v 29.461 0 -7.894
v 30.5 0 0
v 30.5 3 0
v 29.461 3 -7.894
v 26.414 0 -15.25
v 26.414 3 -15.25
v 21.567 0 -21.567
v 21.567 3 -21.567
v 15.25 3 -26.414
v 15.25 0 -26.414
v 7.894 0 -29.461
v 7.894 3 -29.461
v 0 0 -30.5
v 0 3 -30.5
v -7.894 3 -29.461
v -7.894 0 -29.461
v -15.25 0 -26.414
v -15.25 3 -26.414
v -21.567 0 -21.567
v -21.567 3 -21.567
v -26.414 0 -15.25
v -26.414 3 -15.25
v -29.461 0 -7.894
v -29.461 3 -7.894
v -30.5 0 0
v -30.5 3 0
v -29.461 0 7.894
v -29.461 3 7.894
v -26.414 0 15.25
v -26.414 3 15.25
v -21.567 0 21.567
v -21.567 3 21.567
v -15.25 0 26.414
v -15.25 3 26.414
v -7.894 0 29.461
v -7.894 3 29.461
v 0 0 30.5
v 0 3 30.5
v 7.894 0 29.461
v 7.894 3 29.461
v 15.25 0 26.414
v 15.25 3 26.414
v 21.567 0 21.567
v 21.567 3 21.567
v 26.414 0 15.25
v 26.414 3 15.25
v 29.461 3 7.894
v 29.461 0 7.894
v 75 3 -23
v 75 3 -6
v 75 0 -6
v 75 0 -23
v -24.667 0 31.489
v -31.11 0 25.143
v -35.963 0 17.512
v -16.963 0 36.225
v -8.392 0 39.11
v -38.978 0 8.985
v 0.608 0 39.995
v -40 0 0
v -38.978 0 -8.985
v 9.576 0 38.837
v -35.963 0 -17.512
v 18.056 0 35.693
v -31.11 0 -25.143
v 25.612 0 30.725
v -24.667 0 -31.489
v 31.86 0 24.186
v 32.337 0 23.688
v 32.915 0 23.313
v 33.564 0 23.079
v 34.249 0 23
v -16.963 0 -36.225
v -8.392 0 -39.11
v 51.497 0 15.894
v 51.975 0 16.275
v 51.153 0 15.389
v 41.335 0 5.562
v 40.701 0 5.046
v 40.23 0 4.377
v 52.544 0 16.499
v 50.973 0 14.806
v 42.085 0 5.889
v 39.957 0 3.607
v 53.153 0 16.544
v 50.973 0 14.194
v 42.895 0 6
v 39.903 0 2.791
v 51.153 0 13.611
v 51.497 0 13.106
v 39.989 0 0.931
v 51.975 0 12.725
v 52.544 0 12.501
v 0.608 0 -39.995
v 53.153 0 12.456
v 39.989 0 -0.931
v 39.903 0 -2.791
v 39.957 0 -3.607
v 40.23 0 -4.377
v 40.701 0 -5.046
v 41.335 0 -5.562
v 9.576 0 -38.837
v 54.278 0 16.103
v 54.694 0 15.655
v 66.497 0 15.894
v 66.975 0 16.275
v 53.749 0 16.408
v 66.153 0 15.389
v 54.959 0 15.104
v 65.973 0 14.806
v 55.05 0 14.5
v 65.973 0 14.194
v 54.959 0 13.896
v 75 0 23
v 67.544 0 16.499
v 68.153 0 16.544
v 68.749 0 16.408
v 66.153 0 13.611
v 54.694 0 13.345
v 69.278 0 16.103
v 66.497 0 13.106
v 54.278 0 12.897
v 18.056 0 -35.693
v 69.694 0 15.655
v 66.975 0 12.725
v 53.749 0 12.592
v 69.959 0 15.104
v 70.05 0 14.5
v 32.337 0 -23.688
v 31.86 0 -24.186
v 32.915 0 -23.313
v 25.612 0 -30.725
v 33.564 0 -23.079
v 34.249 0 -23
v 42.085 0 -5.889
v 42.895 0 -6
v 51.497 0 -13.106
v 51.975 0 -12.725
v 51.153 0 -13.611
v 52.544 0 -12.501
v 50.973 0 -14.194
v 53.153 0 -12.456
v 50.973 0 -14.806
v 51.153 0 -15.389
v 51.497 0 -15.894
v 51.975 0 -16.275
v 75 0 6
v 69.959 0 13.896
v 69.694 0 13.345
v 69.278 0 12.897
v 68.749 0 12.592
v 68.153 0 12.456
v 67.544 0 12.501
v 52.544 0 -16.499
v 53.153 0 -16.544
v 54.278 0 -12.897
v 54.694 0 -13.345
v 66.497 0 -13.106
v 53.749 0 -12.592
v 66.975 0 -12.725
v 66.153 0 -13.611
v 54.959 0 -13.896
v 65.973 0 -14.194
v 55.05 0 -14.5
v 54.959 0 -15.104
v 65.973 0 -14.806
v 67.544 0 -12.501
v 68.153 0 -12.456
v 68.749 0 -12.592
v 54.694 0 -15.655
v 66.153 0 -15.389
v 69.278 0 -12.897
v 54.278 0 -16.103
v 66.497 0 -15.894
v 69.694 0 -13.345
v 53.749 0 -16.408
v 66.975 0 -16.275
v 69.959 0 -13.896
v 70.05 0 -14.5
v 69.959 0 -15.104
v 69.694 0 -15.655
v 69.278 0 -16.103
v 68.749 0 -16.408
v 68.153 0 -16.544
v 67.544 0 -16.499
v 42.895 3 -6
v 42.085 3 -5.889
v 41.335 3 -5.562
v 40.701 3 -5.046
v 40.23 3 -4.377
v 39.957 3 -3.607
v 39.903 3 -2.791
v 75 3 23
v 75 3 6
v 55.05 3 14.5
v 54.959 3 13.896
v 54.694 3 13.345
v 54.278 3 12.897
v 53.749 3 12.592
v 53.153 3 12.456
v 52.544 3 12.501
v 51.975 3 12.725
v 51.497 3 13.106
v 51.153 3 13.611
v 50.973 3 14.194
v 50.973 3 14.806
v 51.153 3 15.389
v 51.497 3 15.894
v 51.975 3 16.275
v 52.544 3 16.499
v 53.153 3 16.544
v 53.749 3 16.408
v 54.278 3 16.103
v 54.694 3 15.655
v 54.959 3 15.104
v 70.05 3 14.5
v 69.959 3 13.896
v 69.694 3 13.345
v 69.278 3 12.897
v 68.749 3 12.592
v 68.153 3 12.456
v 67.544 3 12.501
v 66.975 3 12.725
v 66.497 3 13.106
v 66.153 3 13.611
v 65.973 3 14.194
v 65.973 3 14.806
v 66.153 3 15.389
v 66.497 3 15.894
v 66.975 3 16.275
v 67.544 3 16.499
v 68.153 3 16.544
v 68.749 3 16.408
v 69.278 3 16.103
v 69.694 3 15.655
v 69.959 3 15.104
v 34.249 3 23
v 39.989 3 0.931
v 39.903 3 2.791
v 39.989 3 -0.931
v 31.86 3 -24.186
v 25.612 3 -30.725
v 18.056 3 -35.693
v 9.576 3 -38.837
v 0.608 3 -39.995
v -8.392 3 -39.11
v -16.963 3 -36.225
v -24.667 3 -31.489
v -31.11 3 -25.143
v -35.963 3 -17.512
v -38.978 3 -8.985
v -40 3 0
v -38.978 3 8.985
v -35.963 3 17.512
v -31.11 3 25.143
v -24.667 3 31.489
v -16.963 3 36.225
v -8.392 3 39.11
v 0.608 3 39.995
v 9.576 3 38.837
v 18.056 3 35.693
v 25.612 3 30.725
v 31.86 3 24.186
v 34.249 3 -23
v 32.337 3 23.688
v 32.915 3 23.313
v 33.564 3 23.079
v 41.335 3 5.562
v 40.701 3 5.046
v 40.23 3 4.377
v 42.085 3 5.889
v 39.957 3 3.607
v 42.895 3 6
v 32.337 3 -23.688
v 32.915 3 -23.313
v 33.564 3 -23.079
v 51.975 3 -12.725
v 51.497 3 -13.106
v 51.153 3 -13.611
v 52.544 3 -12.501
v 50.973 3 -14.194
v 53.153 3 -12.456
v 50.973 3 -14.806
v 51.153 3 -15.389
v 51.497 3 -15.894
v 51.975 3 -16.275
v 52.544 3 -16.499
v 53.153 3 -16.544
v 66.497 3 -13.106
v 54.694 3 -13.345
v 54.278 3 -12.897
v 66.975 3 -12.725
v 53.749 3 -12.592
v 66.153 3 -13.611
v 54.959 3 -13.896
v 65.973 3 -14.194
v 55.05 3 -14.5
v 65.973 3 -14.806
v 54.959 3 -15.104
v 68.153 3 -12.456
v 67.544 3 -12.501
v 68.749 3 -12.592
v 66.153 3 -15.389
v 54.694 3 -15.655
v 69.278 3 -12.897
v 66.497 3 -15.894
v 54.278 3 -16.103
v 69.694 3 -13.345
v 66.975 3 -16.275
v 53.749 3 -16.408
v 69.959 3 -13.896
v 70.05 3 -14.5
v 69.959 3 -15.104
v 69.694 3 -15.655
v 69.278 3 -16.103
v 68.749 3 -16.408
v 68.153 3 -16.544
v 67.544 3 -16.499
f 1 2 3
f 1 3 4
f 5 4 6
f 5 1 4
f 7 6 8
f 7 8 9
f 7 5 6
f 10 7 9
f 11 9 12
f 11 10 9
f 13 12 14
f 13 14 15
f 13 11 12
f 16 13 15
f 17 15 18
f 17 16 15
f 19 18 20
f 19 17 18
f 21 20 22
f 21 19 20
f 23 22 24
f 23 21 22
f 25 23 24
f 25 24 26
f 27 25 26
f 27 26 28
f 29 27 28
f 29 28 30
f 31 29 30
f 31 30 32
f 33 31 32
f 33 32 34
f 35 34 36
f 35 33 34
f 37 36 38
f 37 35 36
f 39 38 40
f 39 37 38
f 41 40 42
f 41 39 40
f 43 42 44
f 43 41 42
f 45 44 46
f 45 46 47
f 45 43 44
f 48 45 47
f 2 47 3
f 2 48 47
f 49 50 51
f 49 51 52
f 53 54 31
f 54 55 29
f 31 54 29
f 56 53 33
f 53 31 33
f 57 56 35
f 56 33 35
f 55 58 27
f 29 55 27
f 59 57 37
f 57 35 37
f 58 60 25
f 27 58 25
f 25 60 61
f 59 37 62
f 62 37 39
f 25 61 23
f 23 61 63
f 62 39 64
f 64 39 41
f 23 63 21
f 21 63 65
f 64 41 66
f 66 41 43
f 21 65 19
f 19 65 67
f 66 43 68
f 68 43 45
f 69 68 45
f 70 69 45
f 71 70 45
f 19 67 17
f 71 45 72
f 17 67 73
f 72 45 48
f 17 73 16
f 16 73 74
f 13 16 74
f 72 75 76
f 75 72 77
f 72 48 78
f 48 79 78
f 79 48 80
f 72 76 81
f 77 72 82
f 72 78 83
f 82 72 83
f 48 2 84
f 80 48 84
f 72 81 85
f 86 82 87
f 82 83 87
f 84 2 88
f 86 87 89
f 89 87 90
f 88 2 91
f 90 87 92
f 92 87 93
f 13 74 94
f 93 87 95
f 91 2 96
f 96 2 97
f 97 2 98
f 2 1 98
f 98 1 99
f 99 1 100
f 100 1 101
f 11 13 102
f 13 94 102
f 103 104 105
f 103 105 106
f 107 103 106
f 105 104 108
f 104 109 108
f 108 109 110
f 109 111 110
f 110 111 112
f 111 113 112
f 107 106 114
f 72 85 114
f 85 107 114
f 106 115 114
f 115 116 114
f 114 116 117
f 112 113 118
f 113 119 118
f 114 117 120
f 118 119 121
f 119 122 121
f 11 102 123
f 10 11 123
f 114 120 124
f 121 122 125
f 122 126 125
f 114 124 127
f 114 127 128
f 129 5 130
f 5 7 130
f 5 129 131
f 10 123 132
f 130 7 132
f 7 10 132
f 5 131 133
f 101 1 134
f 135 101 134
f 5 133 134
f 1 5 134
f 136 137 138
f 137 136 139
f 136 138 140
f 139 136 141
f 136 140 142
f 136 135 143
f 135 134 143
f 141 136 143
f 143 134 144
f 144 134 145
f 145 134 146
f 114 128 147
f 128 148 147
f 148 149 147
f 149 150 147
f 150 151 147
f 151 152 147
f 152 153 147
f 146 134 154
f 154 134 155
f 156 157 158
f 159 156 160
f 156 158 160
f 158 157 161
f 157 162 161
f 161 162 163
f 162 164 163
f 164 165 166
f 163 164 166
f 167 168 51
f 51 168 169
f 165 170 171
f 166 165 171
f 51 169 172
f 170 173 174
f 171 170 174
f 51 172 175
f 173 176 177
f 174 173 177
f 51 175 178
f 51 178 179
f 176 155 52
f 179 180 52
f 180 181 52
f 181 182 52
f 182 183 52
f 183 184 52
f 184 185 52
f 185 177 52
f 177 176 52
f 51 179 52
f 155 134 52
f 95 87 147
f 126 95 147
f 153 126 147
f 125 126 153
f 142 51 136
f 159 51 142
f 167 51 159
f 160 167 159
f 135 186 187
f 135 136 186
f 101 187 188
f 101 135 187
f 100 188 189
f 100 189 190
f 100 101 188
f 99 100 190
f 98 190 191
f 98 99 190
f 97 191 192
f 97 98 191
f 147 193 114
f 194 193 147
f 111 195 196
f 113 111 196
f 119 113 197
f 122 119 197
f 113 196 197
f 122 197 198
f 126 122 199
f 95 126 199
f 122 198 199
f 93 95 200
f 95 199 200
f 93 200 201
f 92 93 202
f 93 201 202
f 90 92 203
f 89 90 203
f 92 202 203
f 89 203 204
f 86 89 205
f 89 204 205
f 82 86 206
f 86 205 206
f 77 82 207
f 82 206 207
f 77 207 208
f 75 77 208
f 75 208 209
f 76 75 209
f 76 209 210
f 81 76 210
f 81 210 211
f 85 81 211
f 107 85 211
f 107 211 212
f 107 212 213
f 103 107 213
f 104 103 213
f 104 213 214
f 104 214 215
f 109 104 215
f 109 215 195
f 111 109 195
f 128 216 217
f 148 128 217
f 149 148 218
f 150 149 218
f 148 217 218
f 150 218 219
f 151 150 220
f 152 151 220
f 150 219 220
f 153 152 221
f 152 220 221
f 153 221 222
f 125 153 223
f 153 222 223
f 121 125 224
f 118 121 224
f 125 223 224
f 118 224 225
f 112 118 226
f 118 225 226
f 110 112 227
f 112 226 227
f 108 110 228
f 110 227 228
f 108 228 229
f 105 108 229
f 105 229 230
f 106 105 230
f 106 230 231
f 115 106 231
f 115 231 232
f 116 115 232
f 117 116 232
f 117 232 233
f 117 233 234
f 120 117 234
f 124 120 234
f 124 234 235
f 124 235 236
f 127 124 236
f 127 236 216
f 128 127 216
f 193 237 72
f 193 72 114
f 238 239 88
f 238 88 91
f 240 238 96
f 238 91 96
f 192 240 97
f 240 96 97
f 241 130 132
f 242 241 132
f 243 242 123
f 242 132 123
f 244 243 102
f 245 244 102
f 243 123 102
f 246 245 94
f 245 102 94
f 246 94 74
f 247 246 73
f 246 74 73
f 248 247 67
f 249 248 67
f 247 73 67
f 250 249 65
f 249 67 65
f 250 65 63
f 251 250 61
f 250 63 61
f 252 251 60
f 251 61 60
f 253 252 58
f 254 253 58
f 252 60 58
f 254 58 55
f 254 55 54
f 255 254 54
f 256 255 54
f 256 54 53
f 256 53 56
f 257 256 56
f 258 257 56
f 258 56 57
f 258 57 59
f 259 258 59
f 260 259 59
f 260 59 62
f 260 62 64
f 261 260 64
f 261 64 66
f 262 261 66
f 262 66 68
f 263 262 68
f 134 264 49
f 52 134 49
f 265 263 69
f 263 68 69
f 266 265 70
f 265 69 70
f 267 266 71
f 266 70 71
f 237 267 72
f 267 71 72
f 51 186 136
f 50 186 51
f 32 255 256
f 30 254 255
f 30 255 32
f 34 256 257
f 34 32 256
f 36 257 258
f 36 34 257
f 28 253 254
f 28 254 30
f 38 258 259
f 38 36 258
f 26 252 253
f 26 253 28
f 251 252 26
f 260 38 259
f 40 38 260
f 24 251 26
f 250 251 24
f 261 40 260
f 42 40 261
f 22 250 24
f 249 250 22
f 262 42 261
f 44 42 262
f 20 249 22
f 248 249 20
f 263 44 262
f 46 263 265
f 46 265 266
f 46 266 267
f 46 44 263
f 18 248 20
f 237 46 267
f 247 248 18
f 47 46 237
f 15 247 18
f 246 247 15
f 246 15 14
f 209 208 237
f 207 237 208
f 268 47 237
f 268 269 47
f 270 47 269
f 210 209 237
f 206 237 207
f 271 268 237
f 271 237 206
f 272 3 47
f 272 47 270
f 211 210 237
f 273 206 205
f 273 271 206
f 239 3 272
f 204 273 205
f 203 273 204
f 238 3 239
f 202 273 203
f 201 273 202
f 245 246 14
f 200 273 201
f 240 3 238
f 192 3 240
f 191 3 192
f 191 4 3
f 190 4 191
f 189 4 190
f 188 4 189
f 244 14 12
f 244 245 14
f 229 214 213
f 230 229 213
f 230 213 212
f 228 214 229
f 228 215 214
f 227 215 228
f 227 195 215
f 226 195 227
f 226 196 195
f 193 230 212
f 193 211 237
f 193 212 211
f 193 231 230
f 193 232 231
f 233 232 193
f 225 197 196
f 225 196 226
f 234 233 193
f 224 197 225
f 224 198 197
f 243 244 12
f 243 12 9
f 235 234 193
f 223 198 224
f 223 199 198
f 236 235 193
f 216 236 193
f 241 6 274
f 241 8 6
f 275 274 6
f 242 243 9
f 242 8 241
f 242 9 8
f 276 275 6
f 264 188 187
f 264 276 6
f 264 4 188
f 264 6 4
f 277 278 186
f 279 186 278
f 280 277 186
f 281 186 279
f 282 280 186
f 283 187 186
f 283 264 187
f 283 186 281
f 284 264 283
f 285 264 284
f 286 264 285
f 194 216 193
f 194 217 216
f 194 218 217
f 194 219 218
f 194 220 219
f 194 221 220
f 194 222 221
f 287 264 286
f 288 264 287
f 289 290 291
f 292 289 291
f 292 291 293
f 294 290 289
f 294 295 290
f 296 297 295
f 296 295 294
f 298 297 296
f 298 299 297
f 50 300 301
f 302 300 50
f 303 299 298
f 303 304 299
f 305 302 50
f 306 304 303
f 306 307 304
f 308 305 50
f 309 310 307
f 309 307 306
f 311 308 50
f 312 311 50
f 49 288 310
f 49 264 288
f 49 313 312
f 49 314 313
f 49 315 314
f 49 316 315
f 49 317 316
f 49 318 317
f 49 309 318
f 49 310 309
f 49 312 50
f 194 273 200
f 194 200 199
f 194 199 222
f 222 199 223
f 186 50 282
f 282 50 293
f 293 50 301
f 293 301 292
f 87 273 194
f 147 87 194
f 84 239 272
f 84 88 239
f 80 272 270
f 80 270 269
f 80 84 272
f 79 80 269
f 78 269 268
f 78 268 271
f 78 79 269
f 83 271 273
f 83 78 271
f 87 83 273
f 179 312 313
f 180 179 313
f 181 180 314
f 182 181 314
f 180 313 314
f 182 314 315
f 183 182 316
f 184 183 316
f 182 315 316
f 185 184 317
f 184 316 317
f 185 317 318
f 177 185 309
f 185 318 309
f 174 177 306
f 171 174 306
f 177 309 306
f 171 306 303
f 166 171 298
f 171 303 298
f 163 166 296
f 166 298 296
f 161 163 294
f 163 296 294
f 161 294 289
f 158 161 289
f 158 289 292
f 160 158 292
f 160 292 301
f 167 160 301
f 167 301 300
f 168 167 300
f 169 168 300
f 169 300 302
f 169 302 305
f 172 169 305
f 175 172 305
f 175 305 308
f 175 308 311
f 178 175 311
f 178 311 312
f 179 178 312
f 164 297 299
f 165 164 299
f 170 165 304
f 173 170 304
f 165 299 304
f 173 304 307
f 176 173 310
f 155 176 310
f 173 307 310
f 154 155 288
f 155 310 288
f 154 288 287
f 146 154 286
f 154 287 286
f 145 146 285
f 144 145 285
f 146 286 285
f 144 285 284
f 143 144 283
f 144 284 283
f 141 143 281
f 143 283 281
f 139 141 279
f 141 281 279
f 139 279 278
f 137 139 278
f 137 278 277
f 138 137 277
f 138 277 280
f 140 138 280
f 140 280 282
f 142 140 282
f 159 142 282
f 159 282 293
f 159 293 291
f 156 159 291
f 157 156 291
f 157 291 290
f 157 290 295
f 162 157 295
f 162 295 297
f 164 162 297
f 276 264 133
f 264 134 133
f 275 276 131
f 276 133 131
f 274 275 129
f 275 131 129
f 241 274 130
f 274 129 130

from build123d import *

# Parameters (mm, degrees)
SKETCH1_R           = 40
SKETCH1_R_2         = 30.5
BOSS_EXTRUDE1_DEPTH = 3
SKETCH2_W           = 42.273863656
SKETCH2_H           = 17
BOSS_EXTRUDE2_DEPTH = 3
SKETCH3_R           = 2.05
CUT_EXTRUDE1_DEPTH  = 4
FILLET1_R           = 3


with BuildPart() as part:
    # Sketch1 → Boss-Extrude1 (new body)
    with BuildSketch(Plane(origin=(0, 0, 0), x_dir=(1, 0, 0), z_dir=(0, 1, 0))):
        Circle(SKETCH1_R)
        Circle(SKETCH1_R_2, mode=Mode.SUBTRACT)
    extrude(amount=BOSS_EXTRUDE1_DEPTH)

    # Sketch2 → Boss-Extrude2 (add)
    with BuildSketch(Plane(origin=(0, 3, 0), x_dir=(1, 0, 0), z_dir=(0, 1, 0))):
        with Locations((53.863068172, 14.5)):
            Rectangle(SKETCH2_W, SKETCH2_H)
        with Locations((53.863068172, -14.5)):
            Rectangle(SKETCH2_W, SKETCH2_H)
    extrude(amount=-BOSS_EXTRUDE2_DEPTH)

    # Sketch3 → Cut-Extrude1 (cut, through all)
    with BuildSketch(Plane(origin=(0, 3, 0), x_dir=(1, 0, 0), z_dir=(0, 1, 0))):
        with Locations((53, 14.5)):
            Circle(SKETCH3_R)
        with Locations((68, 14.5)):
            Circle(SKETCH3_R)
        with Locations((53, -14.5)):
            Circle(SKETCH3_R)
        with Locations((68, -14.5)):
            Circle(SKETCH3_R)
    extrude(amount=-CUT_EXTRUDE1_DEPTH, mode=Mode.SUBTRACT)

    # Fillet1
    fillet1_edges = [part.edges().sort_by_distance(p)[0] for p in [
        (39.547439867, 1.5, -6),
        (32.726136344, 1.5, -23),
        (39.547439867, 1.5, 6),
        (32.726136344, 1.5, 23),
    ]]
    fillet(fillet1_edges, radius=FILLET1_R)


solid = part.part
